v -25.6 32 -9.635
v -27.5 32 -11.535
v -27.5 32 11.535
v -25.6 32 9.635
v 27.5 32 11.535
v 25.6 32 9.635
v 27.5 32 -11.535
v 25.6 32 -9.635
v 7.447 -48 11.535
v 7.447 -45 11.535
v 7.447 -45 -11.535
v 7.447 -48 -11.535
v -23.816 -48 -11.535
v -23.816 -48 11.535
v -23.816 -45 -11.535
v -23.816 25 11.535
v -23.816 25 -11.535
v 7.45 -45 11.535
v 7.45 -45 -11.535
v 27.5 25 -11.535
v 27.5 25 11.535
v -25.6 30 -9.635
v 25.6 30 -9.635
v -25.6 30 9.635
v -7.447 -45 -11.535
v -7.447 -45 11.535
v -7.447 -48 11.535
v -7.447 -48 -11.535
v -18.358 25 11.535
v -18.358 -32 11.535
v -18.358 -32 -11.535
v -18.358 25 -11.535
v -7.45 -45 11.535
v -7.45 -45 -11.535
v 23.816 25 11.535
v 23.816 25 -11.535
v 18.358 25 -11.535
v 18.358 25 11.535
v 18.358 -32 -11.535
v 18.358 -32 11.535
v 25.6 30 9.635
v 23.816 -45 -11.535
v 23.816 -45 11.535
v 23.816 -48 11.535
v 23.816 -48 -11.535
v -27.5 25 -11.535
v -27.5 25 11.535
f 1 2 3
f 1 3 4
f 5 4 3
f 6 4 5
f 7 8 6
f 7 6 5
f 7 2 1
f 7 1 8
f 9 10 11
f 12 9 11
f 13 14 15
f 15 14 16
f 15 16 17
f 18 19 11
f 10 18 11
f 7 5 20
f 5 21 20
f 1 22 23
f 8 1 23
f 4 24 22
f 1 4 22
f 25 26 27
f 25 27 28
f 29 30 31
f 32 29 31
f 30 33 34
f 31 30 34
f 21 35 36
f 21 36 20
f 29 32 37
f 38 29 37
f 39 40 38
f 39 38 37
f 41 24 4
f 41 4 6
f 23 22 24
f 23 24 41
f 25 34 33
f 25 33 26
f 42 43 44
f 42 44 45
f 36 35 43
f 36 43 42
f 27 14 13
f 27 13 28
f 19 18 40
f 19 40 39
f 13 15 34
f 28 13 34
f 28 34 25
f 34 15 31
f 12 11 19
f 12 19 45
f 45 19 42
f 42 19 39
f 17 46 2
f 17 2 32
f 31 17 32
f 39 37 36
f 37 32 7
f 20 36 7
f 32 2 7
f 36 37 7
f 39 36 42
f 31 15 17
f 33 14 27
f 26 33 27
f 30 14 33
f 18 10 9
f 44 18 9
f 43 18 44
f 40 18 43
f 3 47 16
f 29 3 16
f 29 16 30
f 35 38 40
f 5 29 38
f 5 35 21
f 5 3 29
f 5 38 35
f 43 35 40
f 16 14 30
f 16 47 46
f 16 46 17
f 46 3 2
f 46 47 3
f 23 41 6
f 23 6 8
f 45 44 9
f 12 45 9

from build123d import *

# Parameters (mm, degrees)
SKETCH1_W                 = 7.82
SKETCH1_H                 = 51
BOSS_EXTRUDE1_DEPTH       = 25
SKETCH2_W                 = 55
SKETCH2_H                 = 23.07
BOSS_EXTRUDE2_DEPTH       = 5
SKETCH3_W                 = 55
SKETCH3_H                 = 23.07
SKETCH3_W_2               = 51.2
SKETCH3_H_2               = 19.27
BOSS_EXTRUDE3_DEPTH       = 2
FILLET1_R                 = 10
FILLET2_R                 = 3
SKETCH4_W                 = 3
SKETCH4_H                 = 10
BOSS_EXTRUDE4_DEPTH       = 2.5
CHAMFER1_SIZE             = 1
SKETCH5_W                 = 98.213610125
SKETCH5_H                 = 151.23254193
CUT_EXTRUDE1_DEPTH        = 30
SKETCH6_W                 = 5.457780719
SKETCH6_H                 = 23.07
BOSS_EXTRUDE5_DEPTH       = 70
SKETCH7_W                 = 16.36852431
SKETCH7_H                 = 23.07
BOSS_EXTRUDE6_DEPTH       = 3
CHAMFER2_SIZE             = 13
CHAMFER2_SIZE2            = 10.908295205
CHAMFER2_OF_MIRROR1_SIZE2 = 10.908295205
CHAMFER2_OF_MIRROR1_SIZE  = 13


with BuildPart() as part:
    # Sketch1 → Boss-Extrude1 (new body)
    with BuildSketch(Plane(origin=(0, 0, 0), x_dir=(1, 0, 0), z_dir=(0, 1, 0))):
        Rectangle(SKETCH1_W, SKETCH1_H)
    extrude(amount=BOSS_EXTRUDE1_DEPTH)

    # Sketch2 → Boss-Extrude2 (add)
    with BuildSketch(Plane(origin=(0, 25, 0), x_dir=(1, 0, 0), z_dir=(0, 1, 0))):
        Rectangle(SKETCH2_W, SKETCH2_H)
    extrude(amount=BOSS_EXTRUDE2_DEPTH)

    # Sketch3 → Boss-Extrude3 (add)
    with BuildSketch(Plane(origin=(0, 30, 0), x_dir=(1, 0, 0), z_dir=(0, 1, 0))):
        Rectangle(SKETCH3_W, SKETCH3_H)
        Rectangle(SKETCH3_W_2, SKETCH3_H_2, mode=Mode.SUBTRACT)
    extrude(amount=BOSS_EXTRUDE3_DEPTH)

    # Fillet1
    fillet1_edges = [part.edges().sort_by_distance(p)[0] for p in [
        (-3.91, 25, 0),
    ]]
    fillet(fillet1_edges, radius=FILLET1_R)

    # Fillet2
    fillet2_edges = [part.edges().sort_by_distance(p)[0] for p in [
        (3.91, 25, 0),
    ]]
    fillet(fillet2_edges, radius=FILLET2_R)

    # Sketch4 → Boss-Extrude4 (add)
    with BuildSketch(Plane.ZY.offset(3.91)):
        Rectangle(SKETCH4_W, SKETCH4_H)
    extrude(amount=BOSS_EXTRUDE4_DEPTH)

    # Chamfer1
    chamfer1_edges = [part.edges().sort_by_distance(p)[0] for p in [
        (-3.91, 2.5, 1.5),
        (-3.91, 5, 0),
        (-3.91, 2.5, -1.5),
    ]]
    chamfer(chamfer1_edges, length=CHAMFER1_SIZE)

    # Sketch5 → Cut-Extrude1 (cut)
    with BuildSketch(Plane(origin=(0, -5, 0), x_dir=(-1, 0, 0), z_dir=(0, -1, 0))):
        with Locations((5.202747623, 0)):
            Rectangle(SKETCH5_W, SKETCH5_H)
    extrude(amount=-CUT_EXTRUDE1_DEPTH, mode=Mode.SUBTRACT)

    # Sketch6 → Boss-Extrude5 (add)
    with BuildSketch(Plane(origin=(0, 25, 0), x_dir=(-1, 0, 0), z_dir=(0, -1, 0))):
        with Locations((-21.087107753, 0)):
            Rectangle(SKETCH6_W, SKETCH6_H)
    boss_extrude5 = extrude(amount=BOSS_EXTRUDE5_DEPTH)

    # Sketch7 → Boss-Extrude6 (add)
    with BuildSketch(Plane(origin=(0, -45, 0), x_dir=(-1, 0, 0), z_dir=(0, -1, 0))):
        with Locations((-15.631735957, 0)):
            Rectangle(SKETCH7_W, SKETCH7_H)
    boss_extrude6 = extrude(amount=BOSS_EXTRUDE6_DEPTH)

    # Chamfer2
    chamfer2_edges = [part.edges().sort_by_distance(p)[0] for p in [
        (18.358217393, -45, 0),
    ]]
    chamfer2_side = [part.faces().sort_by_distance(p)[0] for p in [
        (18.358217393, -10, 0),
    ]]
    chamfer(chamfer2_edges, length=CHAMFER2_SIZE, length2=CHAMFER2_SIZE2, reference=chamfer2_side[0])

    # Mirror1: Boss-Extrude5, Boss-Extrude6 across plane
    add(boss_extrude5.mirror(Plane(origin=(0, 0, 0), x_dir=(0, 0, 1), z_dir=(1, 0, 0))))
    add(boss_extrude6.mirror(Plane(origin=(0, 0, 0), x_dir=(0, 0, 1), z_dir=(1, 0, 0))))

    # Chamfer2 of Mirror1
    chamfer2_of_mirror1_edges = [part.edges().sort_by_distance(p)[0] for p in [
        (-18.358217393, -45, 0),
    ]]
    chamfer(chamfer2_of_mirror1_edges, length=CHAMFER2_OF_MIRROR1_SIZE, length2=CHAMFER2_OF_MIRROR1_SIZE2)


solid = part.part
